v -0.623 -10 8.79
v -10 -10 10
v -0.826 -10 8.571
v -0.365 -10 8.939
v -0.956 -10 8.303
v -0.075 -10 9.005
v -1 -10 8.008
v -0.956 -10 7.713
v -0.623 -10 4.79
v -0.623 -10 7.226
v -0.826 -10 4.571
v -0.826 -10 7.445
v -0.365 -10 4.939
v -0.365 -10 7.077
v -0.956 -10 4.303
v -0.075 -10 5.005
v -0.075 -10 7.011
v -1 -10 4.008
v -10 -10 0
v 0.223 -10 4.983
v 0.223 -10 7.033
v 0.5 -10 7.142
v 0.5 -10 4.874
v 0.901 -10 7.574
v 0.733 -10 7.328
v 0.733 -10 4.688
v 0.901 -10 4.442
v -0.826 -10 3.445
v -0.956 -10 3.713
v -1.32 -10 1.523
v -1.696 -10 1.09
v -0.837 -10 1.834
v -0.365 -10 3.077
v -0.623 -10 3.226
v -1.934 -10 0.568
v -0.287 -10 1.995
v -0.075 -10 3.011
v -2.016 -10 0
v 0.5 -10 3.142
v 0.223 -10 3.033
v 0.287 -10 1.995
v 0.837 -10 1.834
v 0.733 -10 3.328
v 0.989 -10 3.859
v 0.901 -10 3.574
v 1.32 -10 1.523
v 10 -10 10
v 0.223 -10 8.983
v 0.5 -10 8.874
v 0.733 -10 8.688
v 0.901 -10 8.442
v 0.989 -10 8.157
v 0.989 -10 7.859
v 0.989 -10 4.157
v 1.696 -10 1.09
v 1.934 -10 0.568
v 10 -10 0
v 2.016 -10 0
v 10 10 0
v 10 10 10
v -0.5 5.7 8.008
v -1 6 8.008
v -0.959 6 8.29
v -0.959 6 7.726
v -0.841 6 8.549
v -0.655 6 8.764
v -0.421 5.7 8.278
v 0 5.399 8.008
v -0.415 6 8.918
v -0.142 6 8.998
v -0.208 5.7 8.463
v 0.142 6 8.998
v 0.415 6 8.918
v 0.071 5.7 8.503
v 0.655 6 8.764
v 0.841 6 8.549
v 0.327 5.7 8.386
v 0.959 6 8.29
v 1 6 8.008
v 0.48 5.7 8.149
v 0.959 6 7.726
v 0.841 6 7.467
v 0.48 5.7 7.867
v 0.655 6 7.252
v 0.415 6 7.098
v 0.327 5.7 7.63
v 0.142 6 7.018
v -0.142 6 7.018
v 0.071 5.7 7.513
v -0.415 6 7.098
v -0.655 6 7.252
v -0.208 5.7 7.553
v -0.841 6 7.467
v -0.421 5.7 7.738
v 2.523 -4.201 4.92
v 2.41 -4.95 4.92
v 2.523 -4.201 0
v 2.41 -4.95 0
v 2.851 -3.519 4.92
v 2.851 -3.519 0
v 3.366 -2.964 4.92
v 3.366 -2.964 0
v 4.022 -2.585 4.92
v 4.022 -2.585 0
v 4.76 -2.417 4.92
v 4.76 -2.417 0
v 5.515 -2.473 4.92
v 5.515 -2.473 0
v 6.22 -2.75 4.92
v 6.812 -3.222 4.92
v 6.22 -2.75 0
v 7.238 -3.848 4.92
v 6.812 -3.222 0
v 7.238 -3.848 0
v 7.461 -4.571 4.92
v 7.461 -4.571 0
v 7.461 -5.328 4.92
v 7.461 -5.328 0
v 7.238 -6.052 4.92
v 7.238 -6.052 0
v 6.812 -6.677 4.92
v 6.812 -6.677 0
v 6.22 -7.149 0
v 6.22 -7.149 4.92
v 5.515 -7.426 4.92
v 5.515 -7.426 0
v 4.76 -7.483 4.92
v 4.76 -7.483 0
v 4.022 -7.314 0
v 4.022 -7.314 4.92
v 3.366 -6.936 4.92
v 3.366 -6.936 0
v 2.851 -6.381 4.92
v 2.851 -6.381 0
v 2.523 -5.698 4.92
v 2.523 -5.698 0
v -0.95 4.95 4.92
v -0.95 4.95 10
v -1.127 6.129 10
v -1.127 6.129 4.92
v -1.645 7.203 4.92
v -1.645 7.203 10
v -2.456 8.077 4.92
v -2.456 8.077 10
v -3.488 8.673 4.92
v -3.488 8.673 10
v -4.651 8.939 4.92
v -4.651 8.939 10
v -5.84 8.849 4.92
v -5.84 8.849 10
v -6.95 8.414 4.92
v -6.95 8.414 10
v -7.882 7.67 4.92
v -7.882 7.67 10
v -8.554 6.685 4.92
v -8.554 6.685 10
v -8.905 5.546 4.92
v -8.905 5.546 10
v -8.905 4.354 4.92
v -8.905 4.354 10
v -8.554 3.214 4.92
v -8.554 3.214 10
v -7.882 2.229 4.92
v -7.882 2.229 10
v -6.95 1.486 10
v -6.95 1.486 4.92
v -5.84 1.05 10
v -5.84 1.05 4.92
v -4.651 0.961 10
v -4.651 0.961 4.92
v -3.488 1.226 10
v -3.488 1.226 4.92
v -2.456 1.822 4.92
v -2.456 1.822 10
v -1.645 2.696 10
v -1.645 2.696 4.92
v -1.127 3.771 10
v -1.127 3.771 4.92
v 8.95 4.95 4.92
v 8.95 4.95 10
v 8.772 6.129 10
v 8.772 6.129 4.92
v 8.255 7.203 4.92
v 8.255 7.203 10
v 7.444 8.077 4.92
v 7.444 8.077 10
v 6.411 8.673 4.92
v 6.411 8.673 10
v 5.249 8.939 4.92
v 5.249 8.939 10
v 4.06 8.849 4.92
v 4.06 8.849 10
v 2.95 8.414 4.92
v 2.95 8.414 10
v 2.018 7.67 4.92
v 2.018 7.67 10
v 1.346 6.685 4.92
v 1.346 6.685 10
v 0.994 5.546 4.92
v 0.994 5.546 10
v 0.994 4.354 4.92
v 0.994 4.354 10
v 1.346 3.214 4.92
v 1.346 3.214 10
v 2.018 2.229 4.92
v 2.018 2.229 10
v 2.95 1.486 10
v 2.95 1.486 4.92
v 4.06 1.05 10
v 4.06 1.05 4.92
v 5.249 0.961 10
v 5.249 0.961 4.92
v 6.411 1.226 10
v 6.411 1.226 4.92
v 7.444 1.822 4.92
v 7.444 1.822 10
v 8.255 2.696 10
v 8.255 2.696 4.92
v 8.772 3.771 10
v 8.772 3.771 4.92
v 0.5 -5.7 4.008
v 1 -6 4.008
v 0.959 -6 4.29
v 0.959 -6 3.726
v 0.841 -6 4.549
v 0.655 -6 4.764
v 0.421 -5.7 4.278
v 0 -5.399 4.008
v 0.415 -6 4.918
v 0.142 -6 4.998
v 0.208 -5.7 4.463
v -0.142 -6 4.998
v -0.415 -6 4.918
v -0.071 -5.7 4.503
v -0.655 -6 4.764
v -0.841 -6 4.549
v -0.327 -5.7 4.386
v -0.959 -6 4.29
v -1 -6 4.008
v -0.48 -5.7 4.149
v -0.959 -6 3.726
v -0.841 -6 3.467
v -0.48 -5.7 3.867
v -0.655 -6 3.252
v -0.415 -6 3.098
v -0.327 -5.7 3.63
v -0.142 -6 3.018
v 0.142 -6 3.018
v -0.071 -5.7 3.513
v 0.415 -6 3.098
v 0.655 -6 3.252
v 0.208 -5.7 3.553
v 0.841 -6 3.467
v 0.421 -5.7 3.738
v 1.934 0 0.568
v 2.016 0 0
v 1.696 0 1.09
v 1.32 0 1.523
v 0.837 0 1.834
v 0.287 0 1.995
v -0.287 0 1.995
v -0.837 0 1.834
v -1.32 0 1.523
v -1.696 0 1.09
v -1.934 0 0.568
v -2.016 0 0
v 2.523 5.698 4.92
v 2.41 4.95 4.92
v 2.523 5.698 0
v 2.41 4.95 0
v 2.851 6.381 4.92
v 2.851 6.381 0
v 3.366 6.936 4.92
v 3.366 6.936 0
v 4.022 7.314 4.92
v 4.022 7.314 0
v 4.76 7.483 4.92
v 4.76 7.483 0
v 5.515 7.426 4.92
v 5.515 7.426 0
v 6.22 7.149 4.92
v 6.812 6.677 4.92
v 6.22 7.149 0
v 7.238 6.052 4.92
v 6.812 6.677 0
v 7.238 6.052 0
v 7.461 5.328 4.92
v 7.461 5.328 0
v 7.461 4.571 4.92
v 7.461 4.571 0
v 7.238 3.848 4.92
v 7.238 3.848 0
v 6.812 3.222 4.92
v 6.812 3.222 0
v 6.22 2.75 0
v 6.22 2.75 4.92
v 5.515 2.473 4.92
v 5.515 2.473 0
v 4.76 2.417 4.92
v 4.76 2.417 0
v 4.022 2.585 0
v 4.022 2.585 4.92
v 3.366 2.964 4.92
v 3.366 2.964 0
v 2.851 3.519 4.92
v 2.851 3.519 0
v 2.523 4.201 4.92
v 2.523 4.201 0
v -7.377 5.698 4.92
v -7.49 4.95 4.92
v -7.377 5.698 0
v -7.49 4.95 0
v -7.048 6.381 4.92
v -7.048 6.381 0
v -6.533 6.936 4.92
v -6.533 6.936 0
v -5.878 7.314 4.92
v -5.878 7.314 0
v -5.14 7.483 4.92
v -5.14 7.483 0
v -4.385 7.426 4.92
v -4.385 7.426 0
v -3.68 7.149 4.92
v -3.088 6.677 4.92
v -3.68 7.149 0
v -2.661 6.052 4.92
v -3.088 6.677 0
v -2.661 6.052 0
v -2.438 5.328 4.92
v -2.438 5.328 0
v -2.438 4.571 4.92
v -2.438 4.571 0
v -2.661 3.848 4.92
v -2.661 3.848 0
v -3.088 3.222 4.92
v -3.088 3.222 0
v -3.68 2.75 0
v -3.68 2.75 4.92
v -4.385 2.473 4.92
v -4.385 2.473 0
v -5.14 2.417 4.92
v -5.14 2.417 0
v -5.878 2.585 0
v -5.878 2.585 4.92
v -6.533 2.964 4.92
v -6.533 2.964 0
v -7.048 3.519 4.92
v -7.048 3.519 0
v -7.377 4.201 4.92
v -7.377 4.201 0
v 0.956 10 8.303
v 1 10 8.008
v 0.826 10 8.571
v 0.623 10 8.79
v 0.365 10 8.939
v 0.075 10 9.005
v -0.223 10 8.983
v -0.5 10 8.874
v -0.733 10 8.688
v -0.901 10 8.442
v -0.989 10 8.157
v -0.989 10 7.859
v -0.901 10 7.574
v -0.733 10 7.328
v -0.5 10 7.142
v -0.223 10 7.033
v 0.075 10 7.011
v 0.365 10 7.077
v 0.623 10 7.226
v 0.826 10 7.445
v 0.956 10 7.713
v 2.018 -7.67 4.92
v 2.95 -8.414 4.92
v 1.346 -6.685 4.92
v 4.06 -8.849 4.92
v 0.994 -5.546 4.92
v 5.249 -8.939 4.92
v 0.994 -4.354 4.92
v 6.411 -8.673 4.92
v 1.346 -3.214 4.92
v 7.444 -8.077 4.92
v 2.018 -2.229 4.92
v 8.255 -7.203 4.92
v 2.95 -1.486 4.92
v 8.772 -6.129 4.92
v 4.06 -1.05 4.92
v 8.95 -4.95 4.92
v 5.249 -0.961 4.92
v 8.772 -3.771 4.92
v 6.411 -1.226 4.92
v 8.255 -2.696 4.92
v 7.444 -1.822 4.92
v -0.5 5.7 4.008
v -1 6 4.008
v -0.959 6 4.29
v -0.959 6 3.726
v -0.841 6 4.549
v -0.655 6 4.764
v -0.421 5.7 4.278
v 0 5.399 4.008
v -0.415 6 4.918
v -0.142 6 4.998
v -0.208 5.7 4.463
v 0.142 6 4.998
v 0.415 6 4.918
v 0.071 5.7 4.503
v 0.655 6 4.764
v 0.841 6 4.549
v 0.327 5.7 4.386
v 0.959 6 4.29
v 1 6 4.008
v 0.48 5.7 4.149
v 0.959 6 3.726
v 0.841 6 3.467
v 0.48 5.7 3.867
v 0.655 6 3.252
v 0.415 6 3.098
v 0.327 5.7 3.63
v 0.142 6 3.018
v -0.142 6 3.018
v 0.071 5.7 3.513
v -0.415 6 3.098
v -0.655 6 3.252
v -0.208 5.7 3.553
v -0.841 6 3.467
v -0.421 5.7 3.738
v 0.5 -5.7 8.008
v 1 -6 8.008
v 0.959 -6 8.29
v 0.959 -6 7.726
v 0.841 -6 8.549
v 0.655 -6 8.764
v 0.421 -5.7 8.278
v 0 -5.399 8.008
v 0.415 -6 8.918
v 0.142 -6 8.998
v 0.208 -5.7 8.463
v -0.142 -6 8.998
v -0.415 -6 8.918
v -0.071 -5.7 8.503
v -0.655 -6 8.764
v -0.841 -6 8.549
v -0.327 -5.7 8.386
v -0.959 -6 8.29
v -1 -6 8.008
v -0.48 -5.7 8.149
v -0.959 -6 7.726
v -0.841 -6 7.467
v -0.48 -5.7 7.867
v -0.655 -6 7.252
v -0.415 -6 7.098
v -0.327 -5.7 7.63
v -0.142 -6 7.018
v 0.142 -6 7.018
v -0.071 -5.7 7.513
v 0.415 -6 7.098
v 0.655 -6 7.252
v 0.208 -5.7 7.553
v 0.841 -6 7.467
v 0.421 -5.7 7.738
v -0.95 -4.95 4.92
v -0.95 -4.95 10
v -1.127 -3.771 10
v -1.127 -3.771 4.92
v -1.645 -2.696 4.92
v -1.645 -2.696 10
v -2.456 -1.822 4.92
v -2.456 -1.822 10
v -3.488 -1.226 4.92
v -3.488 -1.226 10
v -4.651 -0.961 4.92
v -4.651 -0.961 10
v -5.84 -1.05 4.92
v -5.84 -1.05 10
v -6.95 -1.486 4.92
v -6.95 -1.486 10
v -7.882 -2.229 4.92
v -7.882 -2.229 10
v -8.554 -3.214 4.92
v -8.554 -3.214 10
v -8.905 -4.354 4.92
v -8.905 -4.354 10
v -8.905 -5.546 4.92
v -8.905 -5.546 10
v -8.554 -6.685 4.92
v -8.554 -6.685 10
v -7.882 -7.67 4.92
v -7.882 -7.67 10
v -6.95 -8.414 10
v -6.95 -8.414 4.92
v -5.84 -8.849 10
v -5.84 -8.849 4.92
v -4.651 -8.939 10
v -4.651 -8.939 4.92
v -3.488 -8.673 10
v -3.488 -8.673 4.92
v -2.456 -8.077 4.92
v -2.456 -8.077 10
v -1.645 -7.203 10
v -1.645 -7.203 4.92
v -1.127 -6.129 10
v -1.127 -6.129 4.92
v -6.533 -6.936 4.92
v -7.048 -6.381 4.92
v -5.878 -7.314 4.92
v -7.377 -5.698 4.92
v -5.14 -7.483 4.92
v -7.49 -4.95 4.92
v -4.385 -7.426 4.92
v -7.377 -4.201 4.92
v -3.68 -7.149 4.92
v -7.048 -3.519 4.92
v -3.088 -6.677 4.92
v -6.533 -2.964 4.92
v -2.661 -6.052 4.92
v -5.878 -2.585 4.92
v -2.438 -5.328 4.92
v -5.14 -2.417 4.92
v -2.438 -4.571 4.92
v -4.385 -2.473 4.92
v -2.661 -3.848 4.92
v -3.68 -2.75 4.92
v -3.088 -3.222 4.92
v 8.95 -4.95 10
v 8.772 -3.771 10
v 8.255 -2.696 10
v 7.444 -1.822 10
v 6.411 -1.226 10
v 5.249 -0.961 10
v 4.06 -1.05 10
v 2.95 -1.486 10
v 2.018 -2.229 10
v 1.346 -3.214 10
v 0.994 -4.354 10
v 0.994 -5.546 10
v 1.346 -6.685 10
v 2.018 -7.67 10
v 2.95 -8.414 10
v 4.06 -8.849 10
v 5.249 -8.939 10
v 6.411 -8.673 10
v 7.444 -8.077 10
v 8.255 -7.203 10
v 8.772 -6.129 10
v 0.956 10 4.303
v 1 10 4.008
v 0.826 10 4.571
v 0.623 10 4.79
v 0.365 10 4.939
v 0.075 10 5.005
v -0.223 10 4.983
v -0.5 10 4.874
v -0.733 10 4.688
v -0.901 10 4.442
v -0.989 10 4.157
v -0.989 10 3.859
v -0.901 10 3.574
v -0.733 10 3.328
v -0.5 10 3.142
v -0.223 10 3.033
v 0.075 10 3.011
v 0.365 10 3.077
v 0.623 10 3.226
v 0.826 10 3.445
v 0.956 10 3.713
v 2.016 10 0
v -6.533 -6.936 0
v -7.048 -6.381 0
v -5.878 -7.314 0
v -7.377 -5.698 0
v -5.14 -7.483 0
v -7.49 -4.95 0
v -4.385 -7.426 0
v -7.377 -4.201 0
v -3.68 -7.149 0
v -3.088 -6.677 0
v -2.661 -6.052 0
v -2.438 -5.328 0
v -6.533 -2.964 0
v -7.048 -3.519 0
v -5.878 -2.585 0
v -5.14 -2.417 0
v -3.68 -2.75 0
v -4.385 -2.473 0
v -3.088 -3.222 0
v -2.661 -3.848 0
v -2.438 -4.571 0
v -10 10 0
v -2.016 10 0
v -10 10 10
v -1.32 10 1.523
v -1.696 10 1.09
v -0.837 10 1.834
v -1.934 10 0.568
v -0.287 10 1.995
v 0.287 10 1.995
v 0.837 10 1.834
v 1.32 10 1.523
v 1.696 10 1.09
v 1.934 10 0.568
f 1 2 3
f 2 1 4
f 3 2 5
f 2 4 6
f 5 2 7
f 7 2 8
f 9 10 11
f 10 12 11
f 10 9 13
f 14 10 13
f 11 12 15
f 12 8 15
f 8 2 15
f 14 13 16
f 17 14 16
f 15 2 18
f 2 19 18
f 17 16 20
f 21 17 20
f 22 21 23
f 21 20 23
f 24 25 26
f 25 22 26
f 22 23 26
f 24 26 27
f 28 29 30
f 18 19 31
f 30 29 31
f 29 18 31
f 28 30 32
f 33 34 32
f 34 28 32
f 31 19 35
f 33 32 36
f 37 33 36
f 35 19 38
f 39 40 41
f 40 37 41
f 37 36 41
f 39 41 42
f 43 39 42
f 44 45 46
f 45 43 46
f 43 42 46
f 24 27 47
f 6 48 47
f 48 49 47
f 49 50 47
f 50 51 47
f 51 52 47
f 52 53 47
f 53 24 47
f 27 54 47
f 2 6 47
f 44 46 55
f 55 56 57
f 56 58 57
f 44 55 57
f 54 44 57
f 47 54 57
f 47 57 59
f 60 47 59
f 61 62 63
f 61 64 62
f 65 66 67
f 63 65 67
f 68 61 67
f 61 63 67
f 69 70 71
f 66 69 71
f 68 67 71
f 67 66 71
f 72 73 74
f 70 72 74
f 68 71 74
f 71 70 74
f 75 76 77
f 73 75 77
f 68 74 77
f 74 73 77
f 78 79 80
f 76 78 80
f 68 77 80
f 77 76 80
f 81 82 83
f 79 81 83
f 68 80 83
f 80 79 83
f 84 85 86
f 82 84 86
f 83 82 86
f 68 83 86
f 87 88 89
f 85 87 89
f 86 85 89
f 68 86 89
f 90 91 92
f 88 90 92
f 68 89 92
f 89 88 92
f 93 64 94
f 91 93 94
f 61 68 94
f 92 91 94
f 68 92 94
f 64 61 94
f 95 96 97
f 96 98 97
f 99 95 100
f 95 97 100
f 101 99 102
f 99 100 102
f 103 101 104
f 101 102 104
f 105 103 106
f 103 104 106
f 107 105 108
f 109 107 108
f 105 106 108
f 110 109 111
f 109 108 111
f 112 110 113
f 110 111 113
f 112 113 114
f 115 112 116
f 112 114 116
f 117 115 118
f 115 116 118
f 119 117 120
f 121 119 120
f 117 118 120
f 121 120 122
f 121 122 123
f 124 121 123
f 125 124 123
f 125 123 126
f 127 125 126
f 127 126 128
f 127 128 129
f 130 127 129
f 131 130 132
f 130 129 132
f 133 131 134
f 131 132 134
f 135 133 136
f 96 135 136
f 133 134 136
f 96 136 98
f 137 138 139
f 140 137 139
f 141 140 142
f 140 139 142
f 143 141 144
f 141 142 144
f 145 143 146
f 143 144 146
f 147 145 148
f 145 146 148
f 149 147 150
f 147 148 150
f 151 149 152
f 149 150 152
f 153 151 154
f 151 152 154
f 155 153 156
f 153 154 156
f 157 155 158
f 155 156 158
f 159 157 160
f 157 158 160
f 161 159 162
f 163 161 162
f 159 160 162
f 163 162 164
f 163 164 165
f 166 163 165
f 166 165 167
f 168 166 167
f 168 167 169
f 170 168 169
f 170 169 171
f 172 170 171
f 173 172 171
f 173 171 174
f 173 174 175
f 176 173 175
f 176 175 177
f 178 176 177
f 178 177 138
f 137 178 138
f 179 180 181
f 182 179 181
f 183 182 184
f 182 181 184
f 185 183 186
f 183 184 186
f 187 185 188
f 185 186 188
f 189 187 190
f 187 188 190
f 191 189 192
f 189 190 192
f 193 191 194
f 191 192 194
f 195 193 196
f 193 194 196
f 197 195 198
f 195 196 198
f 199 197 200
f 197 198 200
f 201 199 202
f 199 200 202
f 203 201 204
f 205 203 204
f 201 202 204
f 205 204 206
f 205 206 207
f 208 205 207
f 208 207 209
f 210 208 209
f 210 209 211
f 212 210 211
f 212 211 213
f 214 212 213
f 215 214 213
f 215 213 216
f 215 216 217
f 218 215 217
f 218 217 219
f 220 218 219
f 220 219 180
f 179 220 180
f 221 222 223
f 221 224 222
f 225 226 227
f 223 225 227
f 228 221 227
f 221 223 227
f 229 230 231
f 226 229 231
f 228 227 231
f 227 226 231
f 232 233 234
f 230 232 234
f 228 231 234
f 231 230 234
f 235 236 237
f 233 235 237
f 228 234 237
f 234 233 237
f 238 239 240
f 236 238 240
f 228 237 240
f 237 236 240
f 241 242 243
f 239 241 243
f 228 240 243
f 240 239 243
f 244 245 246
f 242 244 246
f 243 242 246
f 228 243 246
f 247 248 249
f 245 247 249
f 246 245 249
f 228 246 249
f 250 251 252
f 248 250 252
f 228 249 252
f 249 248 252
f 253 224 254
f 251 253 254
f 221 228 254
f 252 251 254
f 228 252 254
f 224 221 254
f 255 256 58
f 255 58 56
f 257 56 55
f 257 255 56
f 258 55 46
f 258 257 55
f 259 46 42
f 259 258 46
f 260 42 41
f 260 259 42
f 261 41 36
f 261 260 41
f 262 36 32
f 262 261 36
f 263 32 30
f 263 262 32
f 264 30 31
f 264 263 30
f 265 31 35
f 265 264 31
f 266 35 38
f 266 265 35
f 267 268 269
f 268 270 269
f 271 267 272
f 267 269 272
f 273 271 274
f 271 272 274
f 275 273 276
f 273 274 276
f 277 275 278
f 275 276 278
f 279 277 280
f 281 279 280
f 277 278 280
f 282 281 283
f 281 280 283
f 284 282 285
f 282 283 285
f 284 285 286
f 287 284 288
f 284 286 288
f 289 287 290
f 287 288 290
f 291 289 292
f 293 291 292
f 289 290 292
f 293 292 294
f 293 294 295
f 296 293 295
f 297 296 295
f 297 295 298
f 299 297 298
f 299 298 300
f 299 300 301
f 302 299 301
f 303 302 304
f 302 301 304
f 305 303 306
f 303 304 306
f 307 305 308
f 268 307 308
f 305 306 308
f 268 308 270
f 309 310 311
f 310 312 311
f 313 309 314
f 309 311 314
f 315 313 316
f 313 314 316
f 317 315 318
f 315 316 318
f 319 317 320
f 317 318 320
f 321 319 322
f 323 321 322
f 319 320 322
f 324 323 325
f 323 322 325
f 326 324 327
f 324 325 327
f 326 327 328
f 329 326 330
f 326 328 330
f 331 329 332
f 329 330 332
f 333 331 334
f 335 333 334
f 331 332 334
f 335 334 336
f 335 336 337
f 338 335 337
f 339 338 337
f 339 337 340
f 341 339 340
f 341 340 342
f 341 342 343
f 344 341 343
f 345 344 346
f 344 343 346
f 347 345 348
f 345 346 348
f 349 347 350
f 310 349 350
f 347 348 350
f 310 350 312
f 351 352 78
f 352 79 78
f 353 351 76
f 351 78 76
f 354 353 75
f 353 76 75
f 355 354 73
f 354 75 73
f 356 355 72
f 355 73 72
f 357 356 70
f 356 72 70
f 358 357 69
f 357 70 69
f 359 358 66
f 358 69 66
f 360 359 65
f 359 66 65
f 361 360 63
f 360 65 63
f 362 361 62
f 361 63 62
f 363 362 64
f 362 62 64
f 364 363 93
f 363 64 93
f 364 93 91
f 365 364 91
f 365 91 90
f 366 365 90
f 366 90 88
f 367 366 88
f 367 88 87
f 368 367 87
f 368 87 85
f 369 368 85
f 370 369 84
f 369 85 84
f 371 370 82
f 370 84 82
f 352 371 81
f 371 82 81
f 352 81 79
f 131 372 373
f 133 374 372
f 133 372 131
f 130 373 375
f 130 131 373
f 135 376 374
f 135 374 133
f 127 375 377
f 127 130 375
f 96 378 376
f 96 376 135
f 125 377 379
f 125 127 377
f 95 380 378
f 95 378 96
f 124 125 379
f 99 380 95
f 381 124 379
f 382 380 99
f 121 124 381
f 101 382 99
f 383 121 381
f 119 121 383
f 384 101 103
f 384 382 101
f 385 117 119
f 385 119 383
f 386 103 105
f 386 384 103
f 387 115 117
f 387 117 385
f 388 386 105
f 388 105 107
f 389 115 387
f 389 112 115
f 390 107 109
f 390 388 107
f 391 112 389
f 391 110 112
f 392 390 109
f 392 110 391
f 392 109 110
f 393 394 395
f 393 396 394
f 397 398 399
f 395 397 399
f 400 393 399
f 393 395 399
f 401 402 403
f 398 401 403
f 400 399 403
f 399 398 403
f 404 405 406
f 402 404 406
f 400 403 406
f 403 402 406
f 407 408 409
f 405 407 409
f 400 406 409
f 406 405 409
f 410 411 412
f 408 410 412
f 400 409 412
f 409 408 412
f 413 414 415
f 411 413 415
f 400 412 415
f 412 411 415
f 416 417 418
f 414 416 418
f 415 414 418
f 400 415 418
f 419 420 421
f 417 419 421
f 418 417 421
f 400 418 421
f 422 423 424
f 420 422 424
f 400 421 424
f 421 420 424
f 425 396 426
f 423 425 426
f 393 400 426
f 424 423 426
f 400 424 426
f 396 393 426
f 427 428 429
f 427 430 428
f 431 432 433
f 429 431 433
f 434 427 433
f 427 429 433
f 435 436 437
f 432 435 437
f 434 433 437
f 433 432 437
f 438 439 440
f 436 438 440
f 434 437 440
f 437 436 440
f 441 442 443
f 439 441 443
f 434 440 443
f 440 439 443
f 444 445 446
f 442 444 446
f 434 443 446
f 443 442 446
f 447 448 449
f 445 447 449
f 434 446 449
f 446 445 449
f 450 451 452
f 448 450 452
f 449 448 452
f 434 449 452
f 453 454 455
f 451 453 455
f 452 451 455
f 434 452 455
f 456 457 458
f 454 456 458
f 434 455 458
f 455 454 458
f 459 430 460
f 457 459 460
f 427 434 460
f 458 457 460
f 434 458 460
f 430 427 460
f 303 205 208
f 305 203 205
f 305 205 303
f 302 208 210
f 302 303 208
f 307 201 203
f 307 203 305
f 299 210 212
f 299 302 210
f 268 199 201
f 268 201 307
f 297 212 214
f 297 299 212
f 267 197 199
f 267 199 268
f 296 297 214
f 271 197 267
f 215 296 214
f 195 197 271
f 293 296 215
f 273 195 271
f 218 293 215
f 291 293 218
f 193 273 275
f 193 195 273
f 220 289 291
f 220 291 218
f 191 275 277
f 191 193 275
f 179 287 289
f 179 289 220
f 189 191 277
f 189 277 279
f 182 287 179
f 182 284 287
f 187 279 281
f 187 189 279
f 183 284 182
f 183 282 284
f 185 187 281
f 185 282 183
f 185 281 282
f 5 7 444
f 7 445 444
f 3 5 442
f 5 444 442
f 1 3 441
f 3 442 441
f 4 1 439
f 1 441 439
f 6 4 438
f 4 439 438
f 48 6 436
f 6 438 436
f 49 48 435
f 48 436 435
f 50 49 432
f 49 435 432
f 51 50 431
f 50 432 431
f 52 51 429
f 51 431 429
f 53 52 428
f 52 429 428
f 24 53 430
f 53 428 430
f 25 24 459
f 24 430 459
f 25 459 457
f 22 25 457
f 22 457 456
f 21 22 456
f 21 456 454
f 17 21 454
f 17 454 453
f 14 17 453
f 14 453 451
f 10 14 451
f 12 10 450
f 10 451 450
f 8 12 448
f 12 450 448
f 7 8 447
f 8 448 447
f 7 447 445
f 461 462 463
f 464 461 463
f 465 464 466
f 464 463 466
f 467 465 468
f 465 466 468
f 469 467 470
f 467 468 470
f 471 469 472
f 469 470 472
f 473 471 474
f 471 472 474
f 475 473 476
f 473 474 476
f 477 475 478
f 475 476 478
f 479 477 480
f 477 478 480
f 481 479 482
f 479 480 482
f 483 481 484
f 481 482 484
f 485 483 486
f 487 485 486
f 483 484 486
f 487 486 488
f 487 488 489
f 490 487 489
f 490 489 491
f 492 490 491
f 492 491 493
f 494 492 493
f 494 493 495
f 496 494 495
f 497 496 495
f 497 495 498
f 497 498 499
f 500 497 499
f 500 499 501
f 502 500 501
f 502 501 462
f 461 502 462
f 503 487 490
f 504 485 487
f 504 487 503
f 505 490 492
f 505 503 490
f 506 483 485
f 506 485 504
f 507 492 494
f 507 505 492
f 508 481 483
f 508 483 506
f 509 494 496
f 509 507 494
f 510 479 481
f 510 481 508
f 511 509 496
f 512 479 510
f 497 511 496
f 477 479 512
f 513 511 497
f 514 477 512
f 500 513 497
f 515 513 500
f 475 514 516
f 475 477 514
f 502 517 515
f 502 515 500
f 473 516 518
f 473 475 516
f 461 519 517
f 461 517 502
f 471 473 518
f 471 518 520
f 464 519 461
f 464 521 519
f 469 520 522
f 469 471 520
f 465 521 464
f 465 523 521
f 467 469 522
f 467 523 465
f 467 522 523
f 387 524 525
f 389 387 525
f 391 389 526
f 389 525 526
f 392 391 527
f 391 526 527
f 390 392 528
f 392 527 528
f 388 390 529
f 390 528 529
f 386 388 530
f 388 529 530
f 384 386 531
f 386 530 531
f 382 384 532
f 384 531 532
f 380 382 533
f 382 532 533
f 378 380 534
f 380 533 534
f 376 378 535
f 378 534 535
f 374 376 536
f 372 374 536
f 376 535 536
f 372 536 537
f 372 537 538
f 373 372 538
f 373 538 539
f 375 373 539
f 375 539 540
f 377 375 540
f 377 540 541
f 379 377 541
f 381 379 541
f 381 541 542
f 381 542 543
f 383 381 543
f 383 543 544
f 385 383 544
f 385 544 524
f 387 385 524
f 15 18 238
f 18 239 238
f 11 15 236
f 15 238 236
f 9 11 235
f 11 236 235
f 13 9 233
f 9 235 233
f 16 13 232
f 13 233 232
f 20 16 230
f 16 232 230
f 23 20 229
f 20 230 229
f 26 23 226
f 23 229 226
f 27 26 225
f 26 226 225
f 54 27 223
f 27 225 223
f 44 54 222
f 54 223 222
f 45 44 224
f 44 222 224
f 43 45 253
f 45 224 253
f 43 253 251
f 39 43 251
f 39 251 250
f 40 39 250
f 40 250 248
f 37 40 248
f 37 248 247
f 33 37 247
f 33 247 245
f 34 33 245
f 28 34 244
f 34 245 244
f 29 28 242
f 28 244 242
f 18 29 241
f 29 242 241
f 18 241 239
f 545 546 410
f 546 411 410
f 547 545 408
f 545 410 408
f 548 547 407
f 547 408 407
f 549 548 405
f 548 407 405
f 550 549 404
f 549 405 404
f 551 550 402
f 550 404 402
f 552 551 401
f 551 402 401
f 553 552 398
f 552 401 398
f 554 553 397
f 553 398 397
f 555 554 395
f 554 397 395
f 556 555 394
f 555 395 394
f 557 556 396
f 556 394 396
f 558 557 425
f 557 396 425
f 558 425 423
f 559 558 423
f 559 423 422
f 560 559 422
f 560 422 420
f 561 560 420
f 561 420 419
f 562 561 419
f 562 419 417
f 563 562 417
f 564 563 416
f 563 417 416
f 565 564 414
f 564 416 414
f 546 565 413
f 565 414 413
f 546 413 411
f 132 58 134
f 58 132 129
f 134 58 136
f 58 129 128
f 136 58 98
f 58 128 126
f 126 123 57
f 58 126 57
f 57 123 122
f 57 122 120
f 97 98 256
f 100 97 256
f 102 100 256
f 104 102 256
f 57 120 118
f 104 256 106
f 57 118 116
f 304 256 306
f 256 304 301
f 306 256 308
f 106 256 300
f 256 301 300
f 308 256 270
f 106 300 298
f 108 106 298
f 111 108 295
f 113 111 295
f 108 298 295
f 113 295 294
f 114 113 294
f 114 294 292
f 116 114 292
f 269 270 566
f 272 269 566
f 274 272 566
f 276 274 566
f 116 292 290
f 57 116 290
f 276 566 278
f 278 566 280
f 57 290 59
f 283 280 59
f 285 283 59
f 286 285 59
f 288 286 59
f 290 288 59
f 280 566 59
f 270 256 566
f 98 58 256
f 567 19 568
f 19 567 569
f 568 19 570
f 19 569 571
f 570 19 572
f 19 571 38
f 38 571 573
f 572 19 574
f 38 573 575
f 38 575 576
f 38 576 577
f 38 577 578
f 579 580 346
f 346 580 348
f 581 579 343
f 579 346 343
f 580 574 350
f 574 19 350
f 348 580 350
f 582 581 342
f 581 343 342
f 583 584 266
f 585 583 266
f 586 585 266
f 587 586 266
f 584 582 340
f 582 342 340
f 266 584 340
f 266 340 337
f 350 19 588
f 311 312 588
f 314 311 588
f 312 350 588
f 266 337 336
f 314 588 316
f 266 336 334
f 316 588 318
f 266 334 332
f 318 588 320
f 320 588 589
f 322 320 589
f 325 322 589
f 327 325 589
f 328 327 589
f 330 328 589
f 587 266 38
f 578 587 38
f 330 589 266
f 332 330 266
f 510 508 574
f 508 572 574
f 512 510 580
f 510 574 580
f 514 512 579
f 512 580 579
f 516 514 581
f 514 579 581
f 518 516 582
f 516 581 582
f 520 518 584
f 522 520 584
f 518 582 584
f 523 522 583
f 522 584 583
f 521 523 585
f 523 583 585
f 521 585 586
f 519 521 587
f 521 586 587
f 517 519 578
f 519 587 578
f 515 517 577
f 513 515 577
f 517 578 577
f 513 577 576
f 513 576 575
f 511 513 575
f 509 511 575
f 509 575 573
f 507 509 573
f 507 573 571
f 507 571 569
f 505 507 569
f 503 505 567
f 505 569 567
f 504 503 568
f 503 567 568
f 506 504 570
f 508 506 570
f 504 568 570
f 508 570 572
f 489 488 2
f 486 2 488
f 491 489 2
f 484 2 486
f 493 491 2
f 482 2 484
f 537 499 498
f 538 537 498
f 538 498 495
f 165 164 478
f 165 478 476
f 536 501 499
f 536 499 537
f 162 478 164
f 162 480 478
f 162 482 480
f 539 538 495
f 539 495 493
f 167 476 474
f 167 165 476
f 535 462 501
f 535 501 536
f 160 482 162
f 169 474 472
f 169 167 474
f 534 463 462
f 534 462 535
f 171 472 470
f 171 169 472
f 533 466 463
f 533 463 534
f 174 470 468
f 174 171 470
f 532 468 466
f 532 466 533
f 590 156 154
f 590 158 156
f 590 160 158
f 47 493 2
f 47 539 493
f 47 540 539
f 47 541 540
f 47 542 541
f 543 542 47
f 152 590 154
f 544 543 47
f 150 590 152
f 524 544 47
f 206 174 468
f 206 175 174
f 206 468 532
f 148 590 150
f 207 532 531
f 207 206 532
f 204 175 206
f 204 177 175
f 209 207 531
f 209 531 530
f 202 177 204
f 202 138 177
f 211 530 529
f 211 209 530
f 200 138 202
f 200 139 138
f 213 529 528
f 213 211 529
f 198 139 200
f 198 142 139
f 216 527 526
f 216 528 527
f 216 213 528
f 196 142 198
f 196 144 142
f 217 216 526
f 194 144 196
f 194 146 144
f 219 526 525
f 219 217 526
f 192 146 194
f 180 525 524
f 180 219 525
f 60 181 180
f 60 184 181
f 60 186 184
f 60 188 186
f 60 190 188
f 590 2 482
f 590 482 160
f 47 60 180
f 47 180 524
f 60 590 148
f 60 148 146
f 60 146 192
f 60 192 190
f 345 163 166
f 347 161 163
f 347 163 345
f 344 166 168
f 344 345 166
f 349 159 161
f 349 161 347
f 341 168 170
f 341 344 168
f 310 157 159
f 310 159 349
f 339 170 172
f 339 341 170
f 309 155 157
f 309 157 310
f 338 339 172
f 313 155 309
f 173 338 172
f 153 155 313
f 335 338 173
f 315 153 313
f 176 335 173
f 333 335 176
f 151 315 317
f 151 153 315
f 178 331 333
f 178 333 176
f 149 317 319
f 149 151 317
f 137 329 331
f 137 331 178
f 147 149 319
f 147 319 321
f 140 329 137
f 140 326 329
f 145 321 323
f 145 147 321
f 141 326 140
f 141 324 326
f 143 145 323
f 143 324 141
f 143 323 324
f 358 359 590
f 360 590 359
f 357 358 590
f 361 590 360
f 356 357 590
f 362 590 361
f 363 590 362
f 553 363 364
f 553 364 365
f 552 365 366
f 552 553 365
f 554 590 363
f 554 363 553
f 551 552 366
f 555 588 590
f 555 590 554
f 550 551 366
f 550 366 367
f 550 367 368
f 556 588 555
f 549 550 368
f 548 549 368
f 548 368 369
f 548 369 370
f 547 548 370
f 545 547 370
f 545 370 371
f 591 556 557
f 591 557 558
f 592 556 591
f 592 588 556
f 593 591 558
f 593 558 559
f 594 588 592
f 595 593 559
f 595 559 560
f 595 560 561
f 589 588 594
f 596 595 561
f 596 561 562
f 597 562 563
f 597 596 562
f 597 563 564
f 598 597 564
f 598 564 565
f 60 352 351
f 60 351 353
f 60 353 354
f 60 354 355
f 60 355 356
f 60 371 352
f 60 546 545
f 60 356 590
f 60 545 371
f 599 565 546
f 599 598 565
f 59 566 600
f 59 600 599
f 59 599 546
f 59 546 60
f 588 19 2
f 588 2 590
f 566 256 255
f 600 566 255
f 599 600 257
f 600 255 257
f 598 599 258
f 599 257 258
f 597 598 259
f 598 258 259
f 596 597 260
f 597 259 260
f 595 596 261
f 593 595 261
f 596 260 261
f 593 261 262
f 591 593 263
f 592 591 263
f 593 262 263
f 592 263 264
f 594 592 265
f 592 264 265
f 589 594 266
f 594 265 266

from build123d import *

# Parameters (mm, degrees)
F0_W           = 20
F0_H           = 20
F1_DEPTH       = 10
F2_R           = 2.0157754343
F3_DEPTH       = 25
F3_DEPTH_BACK  = 25
F5_D           = 5.08
F5_CBORE_D     = 8
F5_CBORE_DEPTH = 5.08
F7_D           = 2
F7_DEPTH       = 4
F7_TIP         = 0.600860619
F9_D           = 2
F9_DEPTH       = 4
F9_TIP         = 0.600860619


with BuildPart() as f1:
    # F0 (on Top) → F1 (new body)
    with BuildSketch(Plane.XY):
        Rectangle(F0_W, F0_H)
    extrude(amount=F1_DEPTH)

    # F2 (on Front) → F3 (cut, two sides)
    with BuildSketch(Plane.XZ) as f3_sk:
        Circle(F2_R)
    extrude(amount=F3_DEPTH, mode=Mode.SUBTRACT)
    extrude(f3_sk.sketch, amount=-F3_DEPTH_BACK, mode=Mode.SUBTRACT)

    # F5 (through all)
    with Locations(Plane.XY.offset(10)):
        with Locations((-4.9497474683, 4.9497474683), (-4.9497474683, -4.9497474683), (4.9497474683, -4.9497474683), (4.9497474683, 4.9497474683)):
            CounterBoreHole(F5_D / 2, F5_CBORE_D / 2, F5_CBORE_DEPTH)

    # F7
    with Locations(Plane.XZ.offset(10)):
        with Locations((0, 8.0078877172), (0, 4.0078877172)):
            Hole(F7_D / 2, depth=F7_DEPTH)
            with Locations((0, 0, -(F7_DEPTH + F7_TIP / 2))):  # 118° drill point
                Cone(0, F7_D / 2, F7_TIP, mode=Mode.SUBTRACT)

    # F9
    with Locations(Plane(origin=(0, 10, 0), x_dir=(-1, 0, 0), z_dir=(0, 1, 0))):
        with Locations((0, 4.0078877172), (0, 8.0078877172)):
            Hole(F9_D / 2, depth=F9_DEPTH)
            with Locations((0, 0, -(F9_DEPTH + F9_TIP / 2))):  # 118° drill point
                Cone(0, F9_D / 2, F9_TIP, mode=Mode.SUBTRACT)


solid = f1.part
